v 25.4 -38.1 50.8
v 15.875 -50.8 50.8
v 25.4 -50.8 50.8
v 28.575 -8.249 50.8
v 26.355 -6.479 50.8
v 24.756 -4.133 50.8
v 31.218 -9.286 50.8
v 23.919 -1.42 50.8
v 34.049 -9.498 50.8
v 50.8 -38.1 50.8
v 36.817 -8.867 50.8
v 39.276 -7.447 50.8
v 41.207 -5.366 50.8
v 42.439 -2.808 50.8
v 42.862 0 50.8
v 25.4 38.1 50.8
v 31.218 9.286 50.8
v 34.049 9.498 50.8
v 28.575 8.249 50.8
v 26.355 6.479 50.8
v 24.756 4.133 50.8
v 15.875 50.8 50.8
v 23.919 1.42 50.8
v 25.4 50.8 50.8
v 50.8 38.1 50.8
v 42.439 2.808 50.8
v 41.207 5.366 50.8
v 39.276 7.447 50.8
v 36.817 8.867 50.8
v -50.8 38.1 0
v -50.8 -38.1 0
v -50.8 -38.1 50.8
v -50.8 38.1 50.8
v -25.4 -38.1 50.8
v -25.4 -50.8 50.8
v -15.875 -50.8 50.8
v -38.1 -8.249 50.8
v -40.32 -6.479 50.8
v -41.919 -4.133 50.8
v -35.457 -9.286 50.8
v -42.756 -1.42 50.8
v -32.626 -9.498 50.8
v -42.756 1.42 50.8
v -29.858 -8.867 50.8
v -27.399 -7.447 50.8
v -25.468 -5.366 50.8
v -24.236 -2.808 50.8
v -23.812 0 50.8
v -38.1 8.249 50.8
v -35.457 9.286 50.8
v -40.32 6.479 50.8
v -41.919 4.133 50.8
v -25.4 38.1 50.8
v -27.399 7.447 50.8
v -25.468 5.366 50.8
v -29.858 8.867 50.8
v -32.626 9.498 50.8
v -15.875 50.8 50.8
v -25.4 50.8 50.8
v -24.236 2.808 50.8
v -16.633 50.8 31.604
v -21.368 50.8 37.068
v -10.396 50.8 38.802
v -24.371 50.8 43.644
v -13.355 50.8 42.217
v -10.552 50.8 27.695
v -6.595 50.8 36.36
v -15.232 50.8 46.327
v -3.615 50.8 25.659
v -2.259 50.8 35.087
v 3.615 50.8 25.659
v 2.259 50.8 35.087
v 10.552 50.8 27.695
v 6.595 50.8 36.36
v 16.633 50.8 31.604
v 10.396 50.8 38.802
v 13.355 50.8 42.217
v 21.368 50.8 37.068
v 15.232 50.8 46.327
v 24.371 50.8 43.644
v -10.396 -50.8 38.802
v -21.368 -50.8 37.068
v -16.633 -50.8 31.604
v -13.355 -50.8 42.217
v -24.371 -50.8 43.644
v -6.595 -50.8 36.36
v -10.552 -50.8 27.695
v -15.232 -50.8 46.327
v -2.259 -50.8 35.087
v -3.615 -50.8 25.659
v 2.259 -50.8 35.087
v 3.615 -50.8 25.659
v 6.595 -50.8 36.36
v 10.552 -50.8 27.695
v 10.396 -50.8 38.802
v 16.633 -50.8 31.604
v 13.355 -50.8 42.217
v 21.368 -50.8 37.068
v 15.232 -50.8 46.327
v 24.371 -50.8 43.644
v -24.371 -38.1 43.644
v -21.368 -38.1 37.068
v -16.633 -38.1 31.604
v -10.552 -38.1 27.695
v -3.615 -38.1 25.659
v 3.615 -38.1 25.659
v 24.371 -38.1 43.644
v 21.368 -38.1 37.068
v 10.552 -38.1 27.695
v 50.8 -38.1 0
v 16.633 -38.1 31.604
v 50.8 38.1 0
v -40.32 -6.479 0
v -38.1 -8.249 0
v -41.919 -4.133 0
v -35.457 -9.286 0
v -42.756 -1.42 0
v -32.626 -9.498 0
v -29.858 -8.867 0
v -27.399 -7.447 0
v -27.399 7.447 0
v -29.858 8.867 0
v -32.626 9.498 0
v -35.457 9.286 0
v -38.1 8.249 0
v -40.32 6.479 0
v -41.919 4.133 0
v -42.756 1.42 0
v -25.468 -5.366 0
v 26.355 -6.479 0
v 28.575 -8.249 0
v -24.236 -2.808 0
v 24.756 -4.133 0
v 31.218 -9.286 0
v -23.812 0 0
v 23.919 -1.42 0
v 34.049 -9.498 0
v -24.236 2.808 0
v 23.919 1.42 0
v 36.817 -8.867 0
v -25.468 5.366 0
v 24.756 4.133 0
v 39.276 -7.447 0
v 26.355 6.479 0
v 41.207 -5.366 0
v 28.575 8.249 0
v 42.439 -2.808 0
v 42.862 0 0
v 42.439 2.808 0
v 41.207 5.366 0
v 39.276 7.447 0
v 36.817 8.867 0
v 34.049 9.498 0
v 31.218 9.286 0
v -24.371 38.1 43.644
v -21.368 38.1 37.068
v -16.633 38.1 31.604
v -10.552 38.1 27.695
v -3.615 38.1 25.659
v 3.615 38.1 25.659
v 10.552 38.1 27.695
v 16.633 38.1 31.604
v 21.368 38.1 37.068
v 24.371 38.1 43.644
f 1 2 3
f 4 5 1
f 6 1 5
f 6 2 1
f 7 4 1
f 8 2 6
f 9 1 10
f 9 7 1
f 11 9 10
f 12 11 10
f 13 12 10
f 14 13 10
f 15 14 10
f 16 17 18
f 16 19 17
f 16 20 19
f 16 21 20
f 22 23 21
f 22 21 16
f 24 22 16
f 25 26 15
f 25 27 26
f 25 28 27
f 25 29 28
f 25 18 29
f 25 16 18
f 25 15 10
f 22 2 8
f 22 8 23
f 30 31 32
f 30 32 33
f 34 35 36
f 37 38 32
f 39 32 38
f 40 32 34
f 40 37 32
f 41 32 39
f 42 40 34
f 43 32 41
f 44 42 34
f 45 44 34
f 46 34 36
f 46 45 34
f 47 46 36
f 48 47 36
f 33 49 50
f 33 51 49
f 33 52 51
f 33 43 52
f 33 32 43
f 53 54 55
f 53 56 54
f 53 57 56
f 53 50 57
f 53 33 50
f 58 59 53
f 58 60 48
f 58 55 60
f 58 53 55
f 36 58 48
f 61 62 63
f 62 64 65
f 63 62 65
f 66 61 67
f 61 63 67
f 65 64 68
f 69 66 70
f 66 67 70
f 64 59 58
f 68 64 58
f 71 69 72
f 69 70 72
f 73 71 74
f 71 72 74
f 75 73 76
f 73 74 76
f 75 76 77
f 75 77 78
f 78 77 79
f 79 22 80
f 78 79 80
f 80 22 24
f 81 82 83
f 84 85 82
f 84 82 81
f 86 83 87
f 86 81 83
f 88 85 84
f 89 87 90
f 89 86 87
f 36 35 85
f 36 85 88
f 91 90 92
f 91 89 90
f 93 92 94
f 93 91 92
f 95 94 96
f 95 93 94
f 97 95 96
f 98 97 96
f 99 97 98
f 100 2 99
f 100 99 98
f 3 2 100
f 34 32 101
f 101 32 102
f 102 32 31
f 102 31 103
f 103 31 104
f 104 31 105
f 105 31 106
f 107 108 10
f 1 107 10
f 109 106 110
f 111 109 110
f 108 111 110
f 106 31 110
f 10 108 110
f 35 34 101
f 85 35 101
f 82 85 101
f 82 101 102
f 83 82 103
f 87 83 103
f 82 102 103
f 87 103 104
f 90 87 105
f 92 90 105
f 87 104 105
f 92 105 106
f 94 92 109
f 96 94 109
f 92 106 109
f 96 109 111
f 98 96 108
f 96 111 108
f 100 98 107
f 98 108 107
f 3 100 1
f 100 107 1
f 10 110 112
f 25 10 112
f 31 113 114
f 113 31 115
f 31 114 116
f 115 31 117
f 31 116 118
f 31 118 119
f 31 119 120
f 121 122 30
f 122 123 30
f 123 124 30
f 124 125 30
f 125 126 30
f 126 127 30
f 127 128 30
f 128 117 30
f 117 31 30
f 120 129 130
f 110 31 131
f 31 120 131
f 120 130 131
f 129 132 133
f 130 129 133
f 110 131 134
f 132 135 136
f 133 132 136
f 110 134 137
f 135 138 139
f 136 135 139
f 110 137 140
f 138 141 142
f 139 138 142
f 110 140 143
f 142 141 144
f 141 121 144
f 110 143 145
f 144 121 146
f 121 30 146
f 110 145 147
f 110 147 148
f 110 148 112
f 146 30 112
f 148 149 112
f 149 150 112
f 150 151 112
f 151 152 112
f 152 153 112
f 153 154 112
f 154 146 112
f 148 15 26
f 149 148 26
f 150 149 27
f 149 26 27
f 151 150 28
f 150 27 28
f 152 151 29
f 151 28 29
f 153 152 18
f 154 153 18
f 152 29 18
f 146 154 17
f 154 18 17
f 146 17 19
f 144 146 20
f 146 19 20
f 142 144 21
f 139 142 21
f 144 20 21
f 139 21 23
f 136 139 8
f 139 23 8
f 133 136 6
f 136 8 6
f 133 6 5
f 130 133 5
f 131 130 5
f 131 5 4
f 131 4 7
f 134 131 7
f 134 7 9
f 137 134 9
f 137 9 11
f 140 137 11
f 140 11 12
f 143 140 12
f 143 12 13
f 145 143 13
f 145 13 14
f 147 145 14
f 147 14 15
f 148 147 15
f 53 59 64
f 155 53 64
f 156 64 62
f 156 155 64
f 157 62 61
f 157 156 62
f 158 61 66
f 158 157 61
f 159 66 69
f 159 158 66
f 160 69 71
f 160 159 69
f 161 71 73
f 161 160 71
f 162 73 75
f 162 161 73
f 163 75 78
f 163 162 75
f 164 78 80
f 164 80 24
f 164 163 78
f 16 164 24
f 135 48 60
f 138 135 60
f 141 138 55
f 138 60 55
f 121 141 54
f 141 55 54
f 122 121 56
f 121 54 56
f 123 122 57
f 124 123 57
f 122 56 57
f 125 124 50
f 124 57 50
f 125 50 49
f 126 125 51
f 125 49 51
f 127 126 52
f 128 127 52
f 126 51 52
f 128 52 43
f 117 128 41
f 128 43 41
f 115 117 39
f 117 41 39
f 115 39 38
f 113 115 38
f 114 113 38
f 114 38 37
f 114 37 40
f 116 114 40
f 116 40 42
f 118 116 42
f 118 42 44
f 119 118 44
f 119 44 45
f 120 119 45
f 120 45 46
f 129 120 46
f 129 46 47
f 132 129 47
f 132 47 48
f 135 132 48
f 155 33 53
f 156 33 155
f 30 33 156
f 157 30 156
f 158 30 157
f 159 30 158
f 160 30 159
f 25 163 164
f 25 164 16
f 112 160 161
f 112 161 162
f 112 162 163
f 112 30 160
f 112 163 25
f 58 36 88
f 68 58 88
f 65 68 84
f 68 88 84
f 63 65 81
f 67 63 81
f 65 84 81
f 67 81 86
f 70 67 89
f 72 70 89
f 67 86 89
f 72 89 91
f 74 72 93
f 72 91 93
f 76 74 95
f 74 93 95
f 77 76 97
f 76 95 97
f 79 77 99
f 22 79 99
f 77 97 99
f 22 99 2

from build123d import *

# Parameters (mm, degrees)
F0_W          = 101.6
F0_H          = 76.2
F1_DEPTH      = 50.8
F3_DEPTH      = 12.7
F3_DEPTH_BACK = 88.9
F4_R          = 15.875
F5_DEPTH      = 122.936
F6_R          = 9.525
F7_DEPTH      = 135.636
F8_R          = 9.525
F9_DEPTH      = 98.298


with BuildPart() as f1:
    # F0 (on Top) → F1 (new body)
    with BuildSketch(Plane.XY):
        Rectangle(F0_W, F0_H)
    extrude(amount=F1_DEPTH)

    # F2 (on face) → F3 (join, two sides)
    with BuildSketch(Plane.XZ.offset(38.1)) as f3_sk:
        with BuildLine():
            Line((25.4, 50.8), (-25.4, 50.8))
            ThreePointArc((-25.4, 50.8), (0, 25.4), (25.4, 50.8))
        make_face()
    extrude(amount=F3_DEPTH)
    extrude(f3_sk.sketch, amount=-F3_DEPTH_BACK)

    # F4 (on face) → F5 (cut)
    with BuildSketch(Plane.XZ.offset(50.8)):
        with Locations((0, 50.8)):
            Circle(F4_R)
    extrude(amount=-F5_DEPTH, mode=Mode.SUBTRACT)

    # F6 (on face) → F7 (cut)
    with BuildSketch(Plane.XY.offset(50.8)):
        with Locations((-33.3375, 0)):
            Circle(F6_R)
    extrude(amount=-F7_DEPTH, mode=Mode.SUBTRACT)

    # F8 (on face) → F9 (cut)
    with BuildSketch(Plane.XY.offset(50.8)):
        with Locations((33.3375, 0)):
            Circle(F8_R)
    extrude(amount=-F9_DEPTH, mode=Mode.SUBTRACT)


solid = f1.part
